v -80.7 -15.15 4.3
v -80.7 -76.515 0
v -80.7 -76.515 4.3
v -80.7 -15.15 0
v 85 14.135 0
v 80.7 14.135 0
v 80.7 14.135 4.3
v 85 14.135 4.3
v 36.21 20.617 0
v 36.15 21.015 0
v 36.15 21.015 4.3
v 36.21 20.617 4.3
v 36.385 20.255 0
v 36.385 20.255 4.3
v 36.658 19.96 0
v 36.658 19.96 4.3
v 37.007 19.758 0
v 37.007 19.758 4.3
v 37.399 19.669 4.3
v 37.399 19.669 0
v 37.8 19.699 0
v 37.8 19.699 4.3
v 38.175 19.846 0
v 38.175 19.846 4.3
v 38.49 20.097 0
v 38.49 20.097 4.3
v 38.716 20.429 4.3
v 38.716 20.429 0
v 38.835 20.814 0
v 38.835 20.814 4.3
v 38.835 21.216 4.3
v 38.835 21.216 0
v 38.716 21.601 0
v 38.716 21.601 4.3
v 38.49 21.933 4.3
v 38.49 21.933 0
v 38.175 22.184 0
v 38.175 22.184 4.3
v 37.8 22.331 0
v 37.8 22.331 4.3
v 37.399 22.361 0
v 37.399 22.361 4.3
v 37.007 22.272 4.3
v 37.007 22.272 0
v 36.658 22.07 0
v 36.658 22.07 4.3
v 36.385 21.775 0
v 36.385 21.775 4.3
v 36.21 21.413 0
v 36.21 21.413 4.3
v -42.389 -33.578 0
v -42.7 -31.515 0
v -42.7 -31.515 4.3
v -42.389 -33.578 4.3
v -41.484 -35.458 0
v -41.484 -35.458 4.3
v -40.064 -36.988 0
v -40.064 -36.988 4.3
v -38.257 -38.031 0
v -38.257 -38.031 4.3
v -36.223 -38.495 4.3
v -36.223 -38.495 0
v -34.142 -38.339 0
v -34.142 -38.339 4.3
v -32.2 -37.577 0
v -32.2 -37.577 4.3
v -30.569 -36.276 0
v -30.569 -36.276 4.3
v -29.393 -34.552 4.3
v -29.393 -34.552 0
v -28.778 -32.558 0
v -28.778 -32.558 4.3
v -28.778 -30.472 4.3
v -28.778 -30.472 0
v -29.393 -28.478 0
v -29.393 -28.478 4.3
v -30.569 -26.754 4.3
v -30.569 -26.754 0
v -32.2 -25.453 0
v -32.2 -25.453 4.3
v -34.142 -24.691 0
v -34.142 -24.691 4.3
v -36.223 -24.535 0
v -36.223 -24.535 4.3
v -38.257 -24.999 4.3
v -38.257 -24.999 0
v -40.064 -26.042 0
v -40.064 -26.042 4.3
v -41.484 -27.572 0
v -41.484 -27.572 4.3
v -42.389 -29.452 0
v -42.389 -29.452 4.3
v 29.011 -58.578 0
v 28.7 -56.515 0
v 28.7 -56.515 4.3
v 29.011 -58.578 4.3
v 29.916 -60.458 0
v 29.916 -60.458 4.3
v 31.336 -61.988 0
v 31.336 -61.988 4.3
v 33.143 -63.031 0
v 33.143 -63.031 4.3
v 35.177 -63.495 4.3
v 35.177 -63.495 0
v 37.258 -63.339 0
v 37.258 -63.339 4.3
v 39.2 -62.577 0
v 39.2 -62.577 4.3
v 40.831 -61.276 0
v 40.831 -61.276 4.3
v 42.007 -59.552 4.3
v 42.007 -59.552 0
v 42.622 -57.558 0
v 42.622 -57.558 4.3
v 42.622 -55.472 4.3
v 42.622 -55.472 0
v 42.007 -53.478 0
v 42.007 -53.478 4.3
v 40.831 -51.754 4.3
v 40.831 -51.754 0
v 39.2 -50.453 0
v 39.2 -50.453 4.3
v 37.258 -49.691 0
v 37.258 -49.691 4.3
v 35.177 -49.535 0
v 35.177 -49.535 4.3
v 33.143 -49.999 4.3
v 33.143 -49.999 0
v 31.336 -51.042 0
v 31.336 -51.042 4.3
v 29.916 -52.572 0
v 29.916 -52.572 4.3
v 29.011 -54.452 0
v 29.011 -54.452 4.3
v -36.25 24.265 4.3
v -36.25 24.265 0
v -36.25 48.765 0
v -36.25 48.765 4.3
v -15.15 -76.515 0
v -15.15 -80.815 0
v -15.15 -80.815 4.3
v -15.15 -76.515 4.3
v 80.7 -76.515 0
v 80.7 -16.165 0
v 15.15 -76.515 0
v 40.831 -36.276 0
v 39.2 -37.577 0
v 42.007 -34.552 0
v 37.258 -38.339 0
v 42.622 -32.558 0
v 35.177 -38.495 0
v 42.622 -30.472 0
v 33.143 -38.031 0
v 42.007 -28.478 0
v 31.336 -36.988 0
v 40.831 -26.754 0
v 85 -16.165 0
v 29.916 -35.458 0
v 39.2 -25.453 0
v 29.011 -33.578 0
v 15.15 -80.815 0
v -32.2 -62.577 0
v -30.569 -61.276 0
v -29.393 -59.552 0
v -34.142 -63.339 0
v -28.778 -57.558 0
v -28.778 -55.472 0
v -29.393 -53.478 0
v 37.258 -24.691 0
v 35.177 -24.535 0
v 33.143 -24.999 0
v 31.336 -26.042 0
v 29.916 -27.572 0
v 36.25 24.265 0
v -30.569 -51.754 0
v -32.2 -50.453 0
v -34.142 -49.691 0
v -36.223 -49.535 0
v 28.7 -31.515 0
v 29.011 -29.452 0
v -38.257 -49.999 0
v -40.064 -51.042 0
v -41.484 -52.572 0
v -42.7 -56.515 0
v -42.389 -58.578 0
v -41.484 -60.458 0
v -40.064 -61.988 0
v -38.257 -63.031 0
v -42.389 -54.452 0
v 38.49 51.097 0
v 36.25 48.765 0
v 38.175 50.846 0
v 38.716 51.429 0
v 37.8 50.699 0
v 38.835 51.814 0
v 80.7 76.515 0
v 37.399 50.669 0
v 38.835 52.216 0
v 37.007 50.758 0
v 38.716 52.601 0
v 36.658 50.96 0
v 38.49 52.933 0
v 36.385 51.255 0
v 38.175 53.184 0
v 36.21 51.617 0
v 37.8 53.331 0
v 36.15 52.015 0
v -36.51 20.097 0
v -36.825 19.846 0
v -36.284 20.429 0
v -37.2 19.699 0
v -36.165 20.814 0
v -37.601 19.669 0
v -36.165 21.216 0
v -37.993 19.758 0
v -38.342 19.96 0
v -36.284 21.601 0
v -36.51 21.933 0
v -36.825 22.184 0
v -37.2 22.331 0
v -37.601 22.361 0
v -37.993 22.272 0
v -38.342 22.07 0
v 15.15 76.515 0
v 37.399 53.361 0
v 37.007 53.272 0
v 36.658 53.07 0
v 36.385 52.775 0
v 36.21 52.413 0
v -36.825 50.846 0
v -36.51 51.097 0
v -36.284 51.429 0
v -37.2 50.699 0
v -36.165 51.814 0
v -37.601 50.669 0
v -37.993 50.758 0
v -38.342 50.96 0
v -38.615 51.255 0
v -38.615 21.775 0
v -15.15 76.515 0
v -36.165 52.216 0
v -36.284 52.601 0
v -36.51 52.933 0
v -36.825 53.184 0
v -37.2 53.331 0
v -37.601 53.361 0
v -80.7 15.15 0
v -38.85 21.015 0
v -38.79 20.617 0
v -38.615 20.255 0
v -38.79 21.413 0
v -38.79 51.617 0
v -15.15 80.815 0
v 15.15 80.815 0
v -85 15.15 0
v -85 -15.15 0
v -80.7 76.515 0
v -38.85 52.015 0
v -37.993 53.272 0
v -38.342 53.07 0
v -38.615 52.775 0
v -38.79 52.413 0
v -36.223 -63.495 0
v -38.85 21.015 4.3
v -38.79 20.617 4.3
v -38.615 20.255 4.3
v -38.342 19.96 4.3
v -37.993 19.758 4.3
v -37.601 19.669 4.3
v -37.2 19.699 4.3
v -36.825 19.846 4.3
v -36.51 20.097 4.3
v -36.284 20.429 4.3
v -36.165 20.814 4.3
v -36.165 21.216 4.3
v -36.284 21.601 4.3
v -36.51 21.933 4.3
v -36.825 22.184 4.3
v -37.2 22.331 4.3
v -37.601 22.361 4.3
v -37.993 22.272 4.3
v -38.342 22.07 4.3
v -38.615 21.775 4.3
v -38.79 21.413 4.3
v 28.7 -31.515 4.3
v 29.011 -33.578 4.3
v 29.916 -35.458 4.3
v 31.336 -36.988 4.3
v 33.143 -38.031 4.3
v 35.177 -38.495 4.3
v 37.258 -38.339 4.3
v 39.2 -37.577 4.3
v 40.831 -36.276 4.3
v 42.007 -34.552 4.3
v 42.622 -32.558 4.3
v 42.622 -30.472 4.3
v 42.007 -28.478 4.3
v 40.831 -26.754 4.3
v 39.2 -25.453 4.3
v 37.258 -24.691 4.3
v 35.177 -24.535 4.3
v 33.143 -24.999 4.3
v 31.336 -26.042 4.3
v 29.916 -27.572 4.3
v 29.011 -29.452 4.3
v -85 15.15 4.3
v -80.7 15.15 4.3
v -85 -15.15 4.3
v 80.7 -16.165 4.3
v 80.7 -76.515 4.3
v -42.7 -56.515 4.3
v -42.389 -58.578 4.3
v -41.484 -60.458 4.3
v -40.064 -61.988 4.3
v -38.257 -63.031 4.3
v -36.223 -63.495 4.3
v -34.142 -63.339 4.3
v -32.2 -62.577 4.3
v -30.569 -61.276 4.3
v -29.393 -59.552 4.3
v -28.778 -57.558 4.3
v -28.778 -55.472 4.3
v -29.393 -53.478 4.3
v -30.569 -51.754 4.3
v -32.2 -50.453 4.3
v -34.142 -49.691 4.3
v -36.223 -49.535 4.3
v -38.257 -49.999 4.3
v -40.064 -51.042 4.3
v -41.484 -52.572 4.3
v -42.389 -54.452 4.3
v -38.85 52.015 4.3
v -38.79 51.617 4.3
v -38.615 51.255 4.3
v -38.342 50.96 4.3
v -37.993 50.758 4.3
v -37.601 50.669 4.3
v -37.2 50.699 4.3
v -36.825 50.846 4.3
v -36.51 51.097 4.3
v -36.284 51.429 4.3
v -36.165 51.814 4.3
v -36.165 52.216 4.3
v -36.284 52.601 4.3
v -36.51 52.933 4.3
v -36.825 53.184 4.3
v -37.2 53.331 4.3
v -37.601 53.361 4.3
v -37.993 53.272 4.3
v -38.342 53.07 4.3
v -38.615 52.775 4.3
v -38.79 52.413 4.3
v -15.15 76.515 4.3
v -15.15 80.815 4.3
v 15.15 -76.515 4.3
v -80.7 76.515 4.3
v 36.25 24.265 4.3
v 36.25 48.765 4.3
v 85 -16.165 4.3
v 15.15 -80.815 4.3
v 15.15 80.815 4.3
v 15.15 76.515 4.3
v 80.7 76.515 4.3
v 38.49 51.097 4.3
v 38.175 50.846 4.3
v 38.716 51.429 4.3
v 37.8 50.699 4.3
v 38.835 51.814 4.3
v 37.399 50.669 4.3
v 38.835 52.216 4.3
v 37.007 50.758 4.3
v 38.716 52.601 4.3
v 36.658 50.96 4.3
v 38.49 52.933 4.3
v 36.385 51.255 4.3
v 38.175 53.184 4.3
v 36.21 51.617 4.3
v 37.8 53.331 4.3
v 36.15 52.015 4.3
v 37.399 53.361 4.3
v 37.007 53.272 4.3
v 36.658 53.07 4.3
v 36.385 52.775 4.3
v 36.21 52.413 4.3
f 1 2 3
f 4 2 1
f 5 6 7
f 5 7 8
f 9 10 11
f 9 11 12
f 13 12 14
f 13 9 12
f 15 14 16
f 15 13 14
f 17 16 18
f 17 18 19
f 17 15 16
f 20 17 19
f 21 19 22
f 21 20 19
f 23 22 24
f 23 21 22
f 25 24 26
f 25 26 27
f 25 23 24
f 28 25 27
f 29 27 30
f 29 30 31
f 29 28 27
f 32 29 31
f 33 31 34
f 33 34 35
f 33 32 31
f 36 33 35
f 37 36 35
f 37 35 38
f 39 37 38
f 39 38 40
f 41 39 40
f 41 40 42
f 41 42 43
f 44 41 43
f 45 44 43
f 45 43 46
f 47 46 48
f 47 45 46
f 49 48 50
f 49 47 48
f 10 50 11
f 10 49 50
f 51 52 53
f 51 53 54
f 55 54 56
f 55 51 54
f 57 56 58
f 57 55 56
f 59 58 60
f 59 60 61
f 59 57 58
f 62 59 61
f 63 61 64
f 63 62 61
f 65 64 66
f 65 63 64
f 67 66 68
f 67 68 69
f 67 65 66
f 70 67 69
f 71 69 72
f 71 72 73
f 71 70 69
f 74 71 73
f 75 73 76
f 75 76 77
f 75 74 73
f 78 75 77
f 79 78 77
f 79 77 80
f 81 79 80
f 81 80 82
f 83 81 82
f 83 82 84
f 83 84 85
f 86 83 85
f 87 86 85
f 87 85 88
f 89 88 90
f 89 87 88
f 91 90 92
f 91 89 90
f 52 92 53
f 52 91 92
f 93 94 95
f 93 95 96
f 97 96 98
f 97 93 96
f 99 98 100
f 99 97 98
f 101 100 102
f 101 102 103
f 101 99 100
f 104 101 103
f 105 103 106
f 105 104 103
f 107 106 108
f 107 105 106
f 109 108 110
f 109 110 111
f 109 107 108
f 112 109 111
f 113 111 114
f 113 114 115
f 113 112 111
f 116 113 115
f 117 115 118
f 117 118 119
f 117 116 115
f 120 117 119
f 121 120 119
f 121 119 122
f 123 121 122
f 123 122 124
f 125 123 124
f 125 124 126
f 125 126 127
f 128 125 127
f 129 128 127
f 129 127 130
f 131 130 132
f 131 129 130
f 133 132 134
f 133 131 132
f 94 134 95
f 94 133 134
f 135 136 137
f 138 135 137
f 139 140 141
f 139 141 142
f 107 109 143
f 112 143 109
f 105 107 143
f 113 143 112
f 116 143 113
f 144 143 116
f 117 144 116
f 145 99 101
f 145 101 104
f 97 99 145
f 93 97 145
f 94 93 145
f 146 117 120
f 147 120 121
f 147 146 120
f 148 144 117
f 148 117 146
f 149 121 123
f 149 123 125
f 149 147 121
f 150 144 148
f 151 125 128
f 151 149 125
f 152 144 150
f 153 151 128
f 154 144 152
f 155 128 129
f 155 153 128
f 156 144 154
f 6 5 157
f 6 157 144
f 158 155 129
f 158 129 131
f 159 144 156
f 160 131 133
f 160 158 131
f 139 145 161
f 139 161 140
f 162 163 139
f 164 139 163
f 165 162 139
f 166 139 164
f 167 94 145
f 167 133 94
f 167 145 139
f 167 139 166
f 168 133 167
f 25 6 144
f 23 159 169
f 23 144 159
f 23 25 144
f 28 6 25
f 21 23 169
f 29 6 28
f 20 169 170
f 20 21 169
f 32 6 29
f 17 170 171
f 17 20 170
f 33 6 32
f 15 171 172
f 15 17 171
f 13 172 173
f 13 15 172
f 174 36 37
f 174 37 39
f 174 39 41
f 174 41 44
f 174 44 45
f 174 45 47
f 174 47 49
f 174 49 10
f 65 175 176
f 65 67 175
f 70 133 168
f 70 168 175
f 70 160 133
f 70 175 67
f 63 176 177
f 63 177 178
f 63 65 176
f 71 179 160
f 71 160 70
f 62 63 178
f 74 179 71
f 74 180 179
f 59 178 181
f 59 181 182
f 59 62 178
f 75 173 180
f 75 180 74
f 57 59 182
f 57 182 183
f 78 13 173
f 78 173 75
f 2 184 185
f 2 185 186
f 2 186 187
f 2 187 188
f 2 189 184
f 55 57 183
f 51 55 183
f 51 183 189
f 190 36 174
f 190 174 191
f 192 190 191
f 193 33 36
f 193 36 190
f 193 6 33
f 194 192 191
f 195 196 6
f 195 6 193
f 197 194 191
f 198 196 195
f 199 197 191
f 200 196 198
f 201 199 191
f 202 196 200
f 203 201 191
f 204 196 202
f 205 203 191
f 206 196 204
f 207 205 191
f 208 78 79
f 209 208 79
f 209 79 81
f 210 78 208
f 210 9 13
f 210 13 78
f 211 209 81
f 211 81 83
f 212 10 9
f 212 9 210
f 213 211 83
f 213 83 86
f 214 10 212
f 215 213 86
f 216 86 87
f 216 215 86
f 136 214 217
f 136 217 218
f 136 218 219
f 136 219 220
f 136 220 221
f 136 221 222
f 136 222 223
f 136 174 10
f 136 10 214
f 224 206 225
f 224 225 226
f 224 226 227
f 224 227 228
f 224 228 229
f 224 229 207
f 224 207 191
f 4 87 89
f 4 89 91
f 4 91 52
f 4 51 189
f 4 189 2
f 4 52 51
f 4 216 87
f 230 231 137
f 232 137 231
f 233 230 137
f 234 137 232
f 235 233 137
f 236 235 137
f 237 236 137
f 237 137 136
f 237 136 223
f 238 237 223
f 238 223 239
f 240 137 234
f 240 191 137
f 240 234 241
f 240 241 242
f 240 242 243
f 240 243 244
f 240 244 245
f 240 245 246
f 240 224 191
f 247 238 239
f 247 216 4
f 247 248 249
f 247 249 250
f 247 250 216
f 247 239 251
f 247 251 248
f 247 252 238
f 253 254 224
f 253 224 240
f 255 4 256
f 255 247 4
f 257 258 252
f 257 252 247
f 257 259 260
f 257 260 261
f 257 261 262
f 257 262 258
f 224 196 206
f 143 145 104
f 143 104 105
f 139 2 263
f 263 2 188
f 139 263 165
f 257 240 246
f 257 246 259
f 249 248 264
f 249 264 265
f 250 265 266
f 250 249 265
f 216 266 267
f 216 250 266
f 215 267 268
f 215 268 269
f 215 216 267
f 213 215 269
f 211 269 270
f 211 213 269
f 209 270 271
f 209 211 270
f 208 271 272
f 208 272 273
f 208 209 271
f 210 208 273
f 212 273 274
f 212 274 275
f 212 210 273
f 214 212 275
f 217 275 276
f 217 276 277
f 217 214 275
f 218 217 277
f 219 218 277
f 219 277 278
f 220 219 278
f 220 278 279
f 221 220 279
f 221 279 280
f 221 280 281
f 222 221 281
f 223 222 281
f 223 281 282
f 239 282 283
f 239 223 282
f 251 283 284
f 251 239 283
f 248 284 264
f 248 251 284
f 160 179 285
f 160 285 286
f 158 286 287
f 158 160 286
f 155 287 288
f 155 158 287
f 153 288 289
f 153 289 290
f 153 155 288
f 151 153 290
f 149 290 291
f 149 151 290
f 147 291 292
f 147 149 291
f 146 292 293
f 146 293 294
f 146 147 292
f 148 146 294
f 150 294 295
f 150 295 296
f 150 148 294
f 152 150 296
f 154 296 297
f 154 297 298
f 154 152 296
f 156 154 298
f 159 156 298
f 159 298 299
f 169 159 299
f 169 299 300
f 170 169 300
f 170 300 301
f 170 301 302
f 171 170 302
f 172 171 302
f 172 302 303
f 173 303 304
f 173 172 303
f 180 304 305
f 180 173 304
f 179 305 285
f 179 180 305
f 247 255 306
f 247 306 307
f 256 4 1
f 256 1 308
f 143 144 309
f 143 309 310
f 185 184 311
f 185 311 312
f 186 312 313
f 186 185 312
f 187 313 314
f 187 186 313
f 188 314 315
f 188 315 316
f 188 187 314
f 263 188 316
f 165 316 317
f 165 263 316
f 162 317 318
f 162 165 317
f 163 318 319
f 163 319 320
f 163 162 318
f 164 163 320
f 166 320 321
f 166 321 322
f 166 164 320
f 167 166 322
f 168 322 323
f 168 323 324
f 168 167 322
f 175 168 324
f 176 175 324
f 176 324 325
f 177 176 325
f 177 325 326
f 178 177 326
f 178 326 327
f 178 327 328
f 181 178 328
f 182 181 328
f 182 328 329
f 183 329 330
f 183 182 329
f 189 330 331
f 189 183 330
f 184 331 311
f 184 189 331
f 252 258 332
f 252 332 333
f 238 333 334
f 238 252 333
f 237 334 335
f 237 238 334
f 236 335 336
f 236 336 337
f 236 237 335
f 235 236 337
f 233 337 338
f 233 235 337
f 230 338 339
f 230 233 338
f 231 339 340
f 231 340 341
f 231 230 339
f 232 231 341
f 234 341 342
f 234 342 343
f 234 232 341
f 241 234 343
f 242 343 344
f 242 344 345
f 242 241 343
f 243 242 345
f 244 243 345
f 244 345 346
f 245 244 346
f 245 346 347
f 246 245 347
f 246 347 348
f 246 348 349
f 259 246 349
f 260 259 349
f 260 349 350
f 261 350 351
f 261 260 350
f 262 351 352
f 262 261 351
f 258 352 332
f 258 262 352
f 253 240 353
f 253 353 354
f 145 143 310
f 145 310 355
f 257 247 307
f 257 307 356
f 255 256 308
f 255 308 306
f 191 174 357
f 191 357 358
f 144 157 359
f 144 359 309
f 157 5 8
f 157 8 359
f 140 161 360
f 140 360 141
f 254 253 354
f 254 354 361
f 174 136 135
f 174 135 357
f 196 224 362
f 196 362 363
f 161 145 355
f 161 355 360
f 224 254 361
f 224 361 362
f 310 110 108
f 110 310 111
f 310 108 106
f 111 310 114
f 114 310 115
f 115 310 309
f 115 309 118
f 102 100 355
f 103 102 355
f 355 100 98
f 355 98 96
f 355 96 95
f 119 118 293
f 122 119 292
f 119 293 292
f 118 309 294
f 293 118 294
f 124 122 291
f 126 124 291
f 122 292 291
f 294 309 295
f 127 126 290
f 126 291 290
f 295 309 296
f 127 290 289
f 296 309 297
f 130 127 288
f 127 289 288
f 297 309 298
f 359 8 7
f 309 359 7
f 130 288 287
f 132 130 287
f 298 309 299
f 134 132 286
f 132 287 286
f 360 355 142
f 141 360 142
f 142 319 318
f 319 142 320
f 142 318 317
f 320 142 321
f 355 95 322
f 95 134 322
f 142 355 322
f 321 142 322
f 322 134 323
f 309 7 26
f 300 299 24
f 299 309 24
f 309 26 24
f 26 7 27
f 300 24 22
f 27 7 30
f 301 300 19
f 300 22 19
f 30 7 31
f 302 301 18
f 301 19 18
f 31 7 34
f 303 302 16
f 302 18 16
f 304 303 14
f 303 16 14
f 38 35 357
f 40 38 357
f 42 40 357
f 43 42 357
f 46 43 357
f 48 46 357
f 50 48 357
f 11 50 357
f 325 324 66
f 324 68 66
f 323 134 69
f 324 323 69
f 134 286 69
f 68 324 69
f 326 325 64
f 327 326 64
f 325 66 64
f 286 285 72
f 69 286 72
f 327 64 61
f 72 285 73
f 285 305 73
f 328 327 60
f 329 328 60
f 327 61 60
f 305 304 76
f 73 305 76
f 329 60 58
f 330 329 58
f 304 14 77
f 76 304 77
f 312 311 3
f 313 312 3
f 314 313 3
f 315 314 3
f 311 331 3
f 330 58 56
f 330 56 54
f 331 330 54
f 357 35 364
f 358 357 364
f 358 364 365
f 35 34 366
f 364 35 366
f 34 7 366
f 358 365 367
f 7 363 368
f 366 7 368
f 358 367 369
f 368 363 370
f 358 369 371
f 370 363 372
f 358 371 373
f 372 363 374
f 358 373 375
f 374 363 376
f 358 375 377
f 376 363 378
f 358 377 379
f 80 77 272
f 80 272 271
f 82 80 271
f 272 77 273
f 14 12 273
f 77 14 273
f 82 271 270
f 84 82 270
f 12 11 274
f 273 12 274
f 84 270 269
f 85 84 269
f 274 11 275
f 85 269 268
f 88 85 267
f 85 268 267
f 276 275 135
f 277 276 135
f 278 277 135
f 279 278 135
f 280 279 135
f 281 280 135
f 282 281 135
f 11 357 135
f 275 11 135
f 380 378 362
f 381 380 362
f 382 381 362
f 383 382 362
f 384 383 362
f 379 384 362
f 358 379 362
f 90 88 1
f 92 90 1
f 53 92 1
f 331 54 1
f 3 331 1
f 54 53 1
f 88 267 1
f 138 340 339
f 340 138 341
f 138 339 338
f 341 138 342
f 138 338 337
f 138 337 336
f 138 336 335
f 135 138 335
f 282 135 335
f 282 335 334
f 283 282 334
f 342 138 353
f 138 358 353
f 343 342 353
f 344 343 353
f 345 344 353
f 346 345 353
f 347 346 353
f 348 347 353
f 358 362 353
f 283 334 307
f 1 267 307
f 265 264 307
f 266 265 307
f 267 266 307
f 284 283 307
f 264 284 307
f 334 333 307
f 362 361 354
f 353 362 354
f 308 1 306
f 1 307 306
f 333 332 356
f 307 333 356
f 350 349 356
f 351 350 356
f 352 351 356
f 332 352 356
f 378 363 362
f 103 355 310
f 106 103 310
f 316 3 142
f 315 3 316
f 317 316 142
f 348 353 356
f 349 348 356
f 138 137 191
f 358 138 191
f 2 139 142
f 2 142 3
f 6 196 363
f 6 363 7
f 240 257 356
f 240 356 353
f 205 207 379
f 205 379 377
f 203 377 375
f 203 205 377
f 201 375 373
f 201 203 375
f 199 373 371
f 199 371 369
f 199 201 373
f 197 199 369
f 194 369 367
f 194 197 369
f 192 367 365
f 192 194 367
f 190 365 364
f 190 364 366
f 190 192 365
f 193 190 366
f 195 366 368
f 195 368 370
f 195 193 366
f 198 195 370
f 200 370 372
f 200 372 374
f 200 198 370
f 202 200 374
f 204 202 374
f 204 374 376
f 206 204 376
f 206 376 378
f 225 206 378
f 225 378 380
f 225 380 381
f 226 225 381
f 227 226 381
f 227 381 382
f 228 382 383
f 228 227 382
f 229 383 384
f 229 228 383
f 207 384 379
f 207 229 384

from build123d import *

# Parameters (mm, degrees)
SKETCH1_R           = 7
SKETCH1_R_2         = 1.35
SKETCH1_W           = 72.5
SKETCH1_H           = 24.5
BOSS_EXTRUDE1_DEPTH = 4.3


with BuildPart() as part:
    # Sketch1 → Boss-Extrude1 (new body)
    with BuildSketch(Plane.XY):
        Polygon((15.15, 76.515), (80.7, 76.515), (80.7, 14.135), (85, 14.135), (85, -16.165), (80.7, -16.165), (80.7, -76.515), (15.15, -76.515), (15.15, -80.815), (-15.15, -80.815), (-15.15, -76.515), (-80.7, -76.515), (-80.7, -15.15), (-85, -15.15), (-85, 15.15), (-80.7, 15.15), (-80.7, 76.515), (-15.15, 76.515), (-15.15, 80.815), (15.15, 80.815), align=None)
        with Locations(Location((35.7, -31.515, 0), (0, 0, 180))):
            Circle(SKETCH1_R, mode=Mode.SUBTRACT)
        with Locations(Location((35.7, -56.515, 0), (0, 0, 180))):
            Circle(SKETCH1_R, mode=Mode.SUBTRACT)
        with Locations(Location((-35.7, -56.515, 0), (0, 0, 180))):
            Circle(SKETCH1_R, mode=Mode.SUBTRACT)
        with Locations(Location((-35.7, -31.515, 0), (0, 0, 180))):
            Circle(SKETCH1_R, mode=Mode.SUBTRACT)
        with Locations(Location((-37.5, 52.015, 0), (0, 0, 180))):
            Circle(SKETCH1_R_2, mode=Mode.SUBTRACT)
        with Locations(Location((-37.5, 21.015, 0), (0, 0, 180))):
            Circle(SKETCH1_R_2, mode=Mode.SUBTRACT)
        with Locations(Location((37.5, 21.015, 0), (0, 0, 180))):
            Circle(SKETCH1_R_2, mode=Mode.SUBTRACT)
        with Locations(Location((37.5, 52.015, 0), (0, 0, 180))):
            Circle(SKETCH1_R_2, mode=Mode.SUBTRACT)
        with Locations((0, 36.515)):
            Rectangle(SKETCH1_W, SKETCH1_H, mode=Mode.SUBTRACT)
    extrude(amount=BOSS_EXTRUDE1_DEPTH)


solid = part.part
